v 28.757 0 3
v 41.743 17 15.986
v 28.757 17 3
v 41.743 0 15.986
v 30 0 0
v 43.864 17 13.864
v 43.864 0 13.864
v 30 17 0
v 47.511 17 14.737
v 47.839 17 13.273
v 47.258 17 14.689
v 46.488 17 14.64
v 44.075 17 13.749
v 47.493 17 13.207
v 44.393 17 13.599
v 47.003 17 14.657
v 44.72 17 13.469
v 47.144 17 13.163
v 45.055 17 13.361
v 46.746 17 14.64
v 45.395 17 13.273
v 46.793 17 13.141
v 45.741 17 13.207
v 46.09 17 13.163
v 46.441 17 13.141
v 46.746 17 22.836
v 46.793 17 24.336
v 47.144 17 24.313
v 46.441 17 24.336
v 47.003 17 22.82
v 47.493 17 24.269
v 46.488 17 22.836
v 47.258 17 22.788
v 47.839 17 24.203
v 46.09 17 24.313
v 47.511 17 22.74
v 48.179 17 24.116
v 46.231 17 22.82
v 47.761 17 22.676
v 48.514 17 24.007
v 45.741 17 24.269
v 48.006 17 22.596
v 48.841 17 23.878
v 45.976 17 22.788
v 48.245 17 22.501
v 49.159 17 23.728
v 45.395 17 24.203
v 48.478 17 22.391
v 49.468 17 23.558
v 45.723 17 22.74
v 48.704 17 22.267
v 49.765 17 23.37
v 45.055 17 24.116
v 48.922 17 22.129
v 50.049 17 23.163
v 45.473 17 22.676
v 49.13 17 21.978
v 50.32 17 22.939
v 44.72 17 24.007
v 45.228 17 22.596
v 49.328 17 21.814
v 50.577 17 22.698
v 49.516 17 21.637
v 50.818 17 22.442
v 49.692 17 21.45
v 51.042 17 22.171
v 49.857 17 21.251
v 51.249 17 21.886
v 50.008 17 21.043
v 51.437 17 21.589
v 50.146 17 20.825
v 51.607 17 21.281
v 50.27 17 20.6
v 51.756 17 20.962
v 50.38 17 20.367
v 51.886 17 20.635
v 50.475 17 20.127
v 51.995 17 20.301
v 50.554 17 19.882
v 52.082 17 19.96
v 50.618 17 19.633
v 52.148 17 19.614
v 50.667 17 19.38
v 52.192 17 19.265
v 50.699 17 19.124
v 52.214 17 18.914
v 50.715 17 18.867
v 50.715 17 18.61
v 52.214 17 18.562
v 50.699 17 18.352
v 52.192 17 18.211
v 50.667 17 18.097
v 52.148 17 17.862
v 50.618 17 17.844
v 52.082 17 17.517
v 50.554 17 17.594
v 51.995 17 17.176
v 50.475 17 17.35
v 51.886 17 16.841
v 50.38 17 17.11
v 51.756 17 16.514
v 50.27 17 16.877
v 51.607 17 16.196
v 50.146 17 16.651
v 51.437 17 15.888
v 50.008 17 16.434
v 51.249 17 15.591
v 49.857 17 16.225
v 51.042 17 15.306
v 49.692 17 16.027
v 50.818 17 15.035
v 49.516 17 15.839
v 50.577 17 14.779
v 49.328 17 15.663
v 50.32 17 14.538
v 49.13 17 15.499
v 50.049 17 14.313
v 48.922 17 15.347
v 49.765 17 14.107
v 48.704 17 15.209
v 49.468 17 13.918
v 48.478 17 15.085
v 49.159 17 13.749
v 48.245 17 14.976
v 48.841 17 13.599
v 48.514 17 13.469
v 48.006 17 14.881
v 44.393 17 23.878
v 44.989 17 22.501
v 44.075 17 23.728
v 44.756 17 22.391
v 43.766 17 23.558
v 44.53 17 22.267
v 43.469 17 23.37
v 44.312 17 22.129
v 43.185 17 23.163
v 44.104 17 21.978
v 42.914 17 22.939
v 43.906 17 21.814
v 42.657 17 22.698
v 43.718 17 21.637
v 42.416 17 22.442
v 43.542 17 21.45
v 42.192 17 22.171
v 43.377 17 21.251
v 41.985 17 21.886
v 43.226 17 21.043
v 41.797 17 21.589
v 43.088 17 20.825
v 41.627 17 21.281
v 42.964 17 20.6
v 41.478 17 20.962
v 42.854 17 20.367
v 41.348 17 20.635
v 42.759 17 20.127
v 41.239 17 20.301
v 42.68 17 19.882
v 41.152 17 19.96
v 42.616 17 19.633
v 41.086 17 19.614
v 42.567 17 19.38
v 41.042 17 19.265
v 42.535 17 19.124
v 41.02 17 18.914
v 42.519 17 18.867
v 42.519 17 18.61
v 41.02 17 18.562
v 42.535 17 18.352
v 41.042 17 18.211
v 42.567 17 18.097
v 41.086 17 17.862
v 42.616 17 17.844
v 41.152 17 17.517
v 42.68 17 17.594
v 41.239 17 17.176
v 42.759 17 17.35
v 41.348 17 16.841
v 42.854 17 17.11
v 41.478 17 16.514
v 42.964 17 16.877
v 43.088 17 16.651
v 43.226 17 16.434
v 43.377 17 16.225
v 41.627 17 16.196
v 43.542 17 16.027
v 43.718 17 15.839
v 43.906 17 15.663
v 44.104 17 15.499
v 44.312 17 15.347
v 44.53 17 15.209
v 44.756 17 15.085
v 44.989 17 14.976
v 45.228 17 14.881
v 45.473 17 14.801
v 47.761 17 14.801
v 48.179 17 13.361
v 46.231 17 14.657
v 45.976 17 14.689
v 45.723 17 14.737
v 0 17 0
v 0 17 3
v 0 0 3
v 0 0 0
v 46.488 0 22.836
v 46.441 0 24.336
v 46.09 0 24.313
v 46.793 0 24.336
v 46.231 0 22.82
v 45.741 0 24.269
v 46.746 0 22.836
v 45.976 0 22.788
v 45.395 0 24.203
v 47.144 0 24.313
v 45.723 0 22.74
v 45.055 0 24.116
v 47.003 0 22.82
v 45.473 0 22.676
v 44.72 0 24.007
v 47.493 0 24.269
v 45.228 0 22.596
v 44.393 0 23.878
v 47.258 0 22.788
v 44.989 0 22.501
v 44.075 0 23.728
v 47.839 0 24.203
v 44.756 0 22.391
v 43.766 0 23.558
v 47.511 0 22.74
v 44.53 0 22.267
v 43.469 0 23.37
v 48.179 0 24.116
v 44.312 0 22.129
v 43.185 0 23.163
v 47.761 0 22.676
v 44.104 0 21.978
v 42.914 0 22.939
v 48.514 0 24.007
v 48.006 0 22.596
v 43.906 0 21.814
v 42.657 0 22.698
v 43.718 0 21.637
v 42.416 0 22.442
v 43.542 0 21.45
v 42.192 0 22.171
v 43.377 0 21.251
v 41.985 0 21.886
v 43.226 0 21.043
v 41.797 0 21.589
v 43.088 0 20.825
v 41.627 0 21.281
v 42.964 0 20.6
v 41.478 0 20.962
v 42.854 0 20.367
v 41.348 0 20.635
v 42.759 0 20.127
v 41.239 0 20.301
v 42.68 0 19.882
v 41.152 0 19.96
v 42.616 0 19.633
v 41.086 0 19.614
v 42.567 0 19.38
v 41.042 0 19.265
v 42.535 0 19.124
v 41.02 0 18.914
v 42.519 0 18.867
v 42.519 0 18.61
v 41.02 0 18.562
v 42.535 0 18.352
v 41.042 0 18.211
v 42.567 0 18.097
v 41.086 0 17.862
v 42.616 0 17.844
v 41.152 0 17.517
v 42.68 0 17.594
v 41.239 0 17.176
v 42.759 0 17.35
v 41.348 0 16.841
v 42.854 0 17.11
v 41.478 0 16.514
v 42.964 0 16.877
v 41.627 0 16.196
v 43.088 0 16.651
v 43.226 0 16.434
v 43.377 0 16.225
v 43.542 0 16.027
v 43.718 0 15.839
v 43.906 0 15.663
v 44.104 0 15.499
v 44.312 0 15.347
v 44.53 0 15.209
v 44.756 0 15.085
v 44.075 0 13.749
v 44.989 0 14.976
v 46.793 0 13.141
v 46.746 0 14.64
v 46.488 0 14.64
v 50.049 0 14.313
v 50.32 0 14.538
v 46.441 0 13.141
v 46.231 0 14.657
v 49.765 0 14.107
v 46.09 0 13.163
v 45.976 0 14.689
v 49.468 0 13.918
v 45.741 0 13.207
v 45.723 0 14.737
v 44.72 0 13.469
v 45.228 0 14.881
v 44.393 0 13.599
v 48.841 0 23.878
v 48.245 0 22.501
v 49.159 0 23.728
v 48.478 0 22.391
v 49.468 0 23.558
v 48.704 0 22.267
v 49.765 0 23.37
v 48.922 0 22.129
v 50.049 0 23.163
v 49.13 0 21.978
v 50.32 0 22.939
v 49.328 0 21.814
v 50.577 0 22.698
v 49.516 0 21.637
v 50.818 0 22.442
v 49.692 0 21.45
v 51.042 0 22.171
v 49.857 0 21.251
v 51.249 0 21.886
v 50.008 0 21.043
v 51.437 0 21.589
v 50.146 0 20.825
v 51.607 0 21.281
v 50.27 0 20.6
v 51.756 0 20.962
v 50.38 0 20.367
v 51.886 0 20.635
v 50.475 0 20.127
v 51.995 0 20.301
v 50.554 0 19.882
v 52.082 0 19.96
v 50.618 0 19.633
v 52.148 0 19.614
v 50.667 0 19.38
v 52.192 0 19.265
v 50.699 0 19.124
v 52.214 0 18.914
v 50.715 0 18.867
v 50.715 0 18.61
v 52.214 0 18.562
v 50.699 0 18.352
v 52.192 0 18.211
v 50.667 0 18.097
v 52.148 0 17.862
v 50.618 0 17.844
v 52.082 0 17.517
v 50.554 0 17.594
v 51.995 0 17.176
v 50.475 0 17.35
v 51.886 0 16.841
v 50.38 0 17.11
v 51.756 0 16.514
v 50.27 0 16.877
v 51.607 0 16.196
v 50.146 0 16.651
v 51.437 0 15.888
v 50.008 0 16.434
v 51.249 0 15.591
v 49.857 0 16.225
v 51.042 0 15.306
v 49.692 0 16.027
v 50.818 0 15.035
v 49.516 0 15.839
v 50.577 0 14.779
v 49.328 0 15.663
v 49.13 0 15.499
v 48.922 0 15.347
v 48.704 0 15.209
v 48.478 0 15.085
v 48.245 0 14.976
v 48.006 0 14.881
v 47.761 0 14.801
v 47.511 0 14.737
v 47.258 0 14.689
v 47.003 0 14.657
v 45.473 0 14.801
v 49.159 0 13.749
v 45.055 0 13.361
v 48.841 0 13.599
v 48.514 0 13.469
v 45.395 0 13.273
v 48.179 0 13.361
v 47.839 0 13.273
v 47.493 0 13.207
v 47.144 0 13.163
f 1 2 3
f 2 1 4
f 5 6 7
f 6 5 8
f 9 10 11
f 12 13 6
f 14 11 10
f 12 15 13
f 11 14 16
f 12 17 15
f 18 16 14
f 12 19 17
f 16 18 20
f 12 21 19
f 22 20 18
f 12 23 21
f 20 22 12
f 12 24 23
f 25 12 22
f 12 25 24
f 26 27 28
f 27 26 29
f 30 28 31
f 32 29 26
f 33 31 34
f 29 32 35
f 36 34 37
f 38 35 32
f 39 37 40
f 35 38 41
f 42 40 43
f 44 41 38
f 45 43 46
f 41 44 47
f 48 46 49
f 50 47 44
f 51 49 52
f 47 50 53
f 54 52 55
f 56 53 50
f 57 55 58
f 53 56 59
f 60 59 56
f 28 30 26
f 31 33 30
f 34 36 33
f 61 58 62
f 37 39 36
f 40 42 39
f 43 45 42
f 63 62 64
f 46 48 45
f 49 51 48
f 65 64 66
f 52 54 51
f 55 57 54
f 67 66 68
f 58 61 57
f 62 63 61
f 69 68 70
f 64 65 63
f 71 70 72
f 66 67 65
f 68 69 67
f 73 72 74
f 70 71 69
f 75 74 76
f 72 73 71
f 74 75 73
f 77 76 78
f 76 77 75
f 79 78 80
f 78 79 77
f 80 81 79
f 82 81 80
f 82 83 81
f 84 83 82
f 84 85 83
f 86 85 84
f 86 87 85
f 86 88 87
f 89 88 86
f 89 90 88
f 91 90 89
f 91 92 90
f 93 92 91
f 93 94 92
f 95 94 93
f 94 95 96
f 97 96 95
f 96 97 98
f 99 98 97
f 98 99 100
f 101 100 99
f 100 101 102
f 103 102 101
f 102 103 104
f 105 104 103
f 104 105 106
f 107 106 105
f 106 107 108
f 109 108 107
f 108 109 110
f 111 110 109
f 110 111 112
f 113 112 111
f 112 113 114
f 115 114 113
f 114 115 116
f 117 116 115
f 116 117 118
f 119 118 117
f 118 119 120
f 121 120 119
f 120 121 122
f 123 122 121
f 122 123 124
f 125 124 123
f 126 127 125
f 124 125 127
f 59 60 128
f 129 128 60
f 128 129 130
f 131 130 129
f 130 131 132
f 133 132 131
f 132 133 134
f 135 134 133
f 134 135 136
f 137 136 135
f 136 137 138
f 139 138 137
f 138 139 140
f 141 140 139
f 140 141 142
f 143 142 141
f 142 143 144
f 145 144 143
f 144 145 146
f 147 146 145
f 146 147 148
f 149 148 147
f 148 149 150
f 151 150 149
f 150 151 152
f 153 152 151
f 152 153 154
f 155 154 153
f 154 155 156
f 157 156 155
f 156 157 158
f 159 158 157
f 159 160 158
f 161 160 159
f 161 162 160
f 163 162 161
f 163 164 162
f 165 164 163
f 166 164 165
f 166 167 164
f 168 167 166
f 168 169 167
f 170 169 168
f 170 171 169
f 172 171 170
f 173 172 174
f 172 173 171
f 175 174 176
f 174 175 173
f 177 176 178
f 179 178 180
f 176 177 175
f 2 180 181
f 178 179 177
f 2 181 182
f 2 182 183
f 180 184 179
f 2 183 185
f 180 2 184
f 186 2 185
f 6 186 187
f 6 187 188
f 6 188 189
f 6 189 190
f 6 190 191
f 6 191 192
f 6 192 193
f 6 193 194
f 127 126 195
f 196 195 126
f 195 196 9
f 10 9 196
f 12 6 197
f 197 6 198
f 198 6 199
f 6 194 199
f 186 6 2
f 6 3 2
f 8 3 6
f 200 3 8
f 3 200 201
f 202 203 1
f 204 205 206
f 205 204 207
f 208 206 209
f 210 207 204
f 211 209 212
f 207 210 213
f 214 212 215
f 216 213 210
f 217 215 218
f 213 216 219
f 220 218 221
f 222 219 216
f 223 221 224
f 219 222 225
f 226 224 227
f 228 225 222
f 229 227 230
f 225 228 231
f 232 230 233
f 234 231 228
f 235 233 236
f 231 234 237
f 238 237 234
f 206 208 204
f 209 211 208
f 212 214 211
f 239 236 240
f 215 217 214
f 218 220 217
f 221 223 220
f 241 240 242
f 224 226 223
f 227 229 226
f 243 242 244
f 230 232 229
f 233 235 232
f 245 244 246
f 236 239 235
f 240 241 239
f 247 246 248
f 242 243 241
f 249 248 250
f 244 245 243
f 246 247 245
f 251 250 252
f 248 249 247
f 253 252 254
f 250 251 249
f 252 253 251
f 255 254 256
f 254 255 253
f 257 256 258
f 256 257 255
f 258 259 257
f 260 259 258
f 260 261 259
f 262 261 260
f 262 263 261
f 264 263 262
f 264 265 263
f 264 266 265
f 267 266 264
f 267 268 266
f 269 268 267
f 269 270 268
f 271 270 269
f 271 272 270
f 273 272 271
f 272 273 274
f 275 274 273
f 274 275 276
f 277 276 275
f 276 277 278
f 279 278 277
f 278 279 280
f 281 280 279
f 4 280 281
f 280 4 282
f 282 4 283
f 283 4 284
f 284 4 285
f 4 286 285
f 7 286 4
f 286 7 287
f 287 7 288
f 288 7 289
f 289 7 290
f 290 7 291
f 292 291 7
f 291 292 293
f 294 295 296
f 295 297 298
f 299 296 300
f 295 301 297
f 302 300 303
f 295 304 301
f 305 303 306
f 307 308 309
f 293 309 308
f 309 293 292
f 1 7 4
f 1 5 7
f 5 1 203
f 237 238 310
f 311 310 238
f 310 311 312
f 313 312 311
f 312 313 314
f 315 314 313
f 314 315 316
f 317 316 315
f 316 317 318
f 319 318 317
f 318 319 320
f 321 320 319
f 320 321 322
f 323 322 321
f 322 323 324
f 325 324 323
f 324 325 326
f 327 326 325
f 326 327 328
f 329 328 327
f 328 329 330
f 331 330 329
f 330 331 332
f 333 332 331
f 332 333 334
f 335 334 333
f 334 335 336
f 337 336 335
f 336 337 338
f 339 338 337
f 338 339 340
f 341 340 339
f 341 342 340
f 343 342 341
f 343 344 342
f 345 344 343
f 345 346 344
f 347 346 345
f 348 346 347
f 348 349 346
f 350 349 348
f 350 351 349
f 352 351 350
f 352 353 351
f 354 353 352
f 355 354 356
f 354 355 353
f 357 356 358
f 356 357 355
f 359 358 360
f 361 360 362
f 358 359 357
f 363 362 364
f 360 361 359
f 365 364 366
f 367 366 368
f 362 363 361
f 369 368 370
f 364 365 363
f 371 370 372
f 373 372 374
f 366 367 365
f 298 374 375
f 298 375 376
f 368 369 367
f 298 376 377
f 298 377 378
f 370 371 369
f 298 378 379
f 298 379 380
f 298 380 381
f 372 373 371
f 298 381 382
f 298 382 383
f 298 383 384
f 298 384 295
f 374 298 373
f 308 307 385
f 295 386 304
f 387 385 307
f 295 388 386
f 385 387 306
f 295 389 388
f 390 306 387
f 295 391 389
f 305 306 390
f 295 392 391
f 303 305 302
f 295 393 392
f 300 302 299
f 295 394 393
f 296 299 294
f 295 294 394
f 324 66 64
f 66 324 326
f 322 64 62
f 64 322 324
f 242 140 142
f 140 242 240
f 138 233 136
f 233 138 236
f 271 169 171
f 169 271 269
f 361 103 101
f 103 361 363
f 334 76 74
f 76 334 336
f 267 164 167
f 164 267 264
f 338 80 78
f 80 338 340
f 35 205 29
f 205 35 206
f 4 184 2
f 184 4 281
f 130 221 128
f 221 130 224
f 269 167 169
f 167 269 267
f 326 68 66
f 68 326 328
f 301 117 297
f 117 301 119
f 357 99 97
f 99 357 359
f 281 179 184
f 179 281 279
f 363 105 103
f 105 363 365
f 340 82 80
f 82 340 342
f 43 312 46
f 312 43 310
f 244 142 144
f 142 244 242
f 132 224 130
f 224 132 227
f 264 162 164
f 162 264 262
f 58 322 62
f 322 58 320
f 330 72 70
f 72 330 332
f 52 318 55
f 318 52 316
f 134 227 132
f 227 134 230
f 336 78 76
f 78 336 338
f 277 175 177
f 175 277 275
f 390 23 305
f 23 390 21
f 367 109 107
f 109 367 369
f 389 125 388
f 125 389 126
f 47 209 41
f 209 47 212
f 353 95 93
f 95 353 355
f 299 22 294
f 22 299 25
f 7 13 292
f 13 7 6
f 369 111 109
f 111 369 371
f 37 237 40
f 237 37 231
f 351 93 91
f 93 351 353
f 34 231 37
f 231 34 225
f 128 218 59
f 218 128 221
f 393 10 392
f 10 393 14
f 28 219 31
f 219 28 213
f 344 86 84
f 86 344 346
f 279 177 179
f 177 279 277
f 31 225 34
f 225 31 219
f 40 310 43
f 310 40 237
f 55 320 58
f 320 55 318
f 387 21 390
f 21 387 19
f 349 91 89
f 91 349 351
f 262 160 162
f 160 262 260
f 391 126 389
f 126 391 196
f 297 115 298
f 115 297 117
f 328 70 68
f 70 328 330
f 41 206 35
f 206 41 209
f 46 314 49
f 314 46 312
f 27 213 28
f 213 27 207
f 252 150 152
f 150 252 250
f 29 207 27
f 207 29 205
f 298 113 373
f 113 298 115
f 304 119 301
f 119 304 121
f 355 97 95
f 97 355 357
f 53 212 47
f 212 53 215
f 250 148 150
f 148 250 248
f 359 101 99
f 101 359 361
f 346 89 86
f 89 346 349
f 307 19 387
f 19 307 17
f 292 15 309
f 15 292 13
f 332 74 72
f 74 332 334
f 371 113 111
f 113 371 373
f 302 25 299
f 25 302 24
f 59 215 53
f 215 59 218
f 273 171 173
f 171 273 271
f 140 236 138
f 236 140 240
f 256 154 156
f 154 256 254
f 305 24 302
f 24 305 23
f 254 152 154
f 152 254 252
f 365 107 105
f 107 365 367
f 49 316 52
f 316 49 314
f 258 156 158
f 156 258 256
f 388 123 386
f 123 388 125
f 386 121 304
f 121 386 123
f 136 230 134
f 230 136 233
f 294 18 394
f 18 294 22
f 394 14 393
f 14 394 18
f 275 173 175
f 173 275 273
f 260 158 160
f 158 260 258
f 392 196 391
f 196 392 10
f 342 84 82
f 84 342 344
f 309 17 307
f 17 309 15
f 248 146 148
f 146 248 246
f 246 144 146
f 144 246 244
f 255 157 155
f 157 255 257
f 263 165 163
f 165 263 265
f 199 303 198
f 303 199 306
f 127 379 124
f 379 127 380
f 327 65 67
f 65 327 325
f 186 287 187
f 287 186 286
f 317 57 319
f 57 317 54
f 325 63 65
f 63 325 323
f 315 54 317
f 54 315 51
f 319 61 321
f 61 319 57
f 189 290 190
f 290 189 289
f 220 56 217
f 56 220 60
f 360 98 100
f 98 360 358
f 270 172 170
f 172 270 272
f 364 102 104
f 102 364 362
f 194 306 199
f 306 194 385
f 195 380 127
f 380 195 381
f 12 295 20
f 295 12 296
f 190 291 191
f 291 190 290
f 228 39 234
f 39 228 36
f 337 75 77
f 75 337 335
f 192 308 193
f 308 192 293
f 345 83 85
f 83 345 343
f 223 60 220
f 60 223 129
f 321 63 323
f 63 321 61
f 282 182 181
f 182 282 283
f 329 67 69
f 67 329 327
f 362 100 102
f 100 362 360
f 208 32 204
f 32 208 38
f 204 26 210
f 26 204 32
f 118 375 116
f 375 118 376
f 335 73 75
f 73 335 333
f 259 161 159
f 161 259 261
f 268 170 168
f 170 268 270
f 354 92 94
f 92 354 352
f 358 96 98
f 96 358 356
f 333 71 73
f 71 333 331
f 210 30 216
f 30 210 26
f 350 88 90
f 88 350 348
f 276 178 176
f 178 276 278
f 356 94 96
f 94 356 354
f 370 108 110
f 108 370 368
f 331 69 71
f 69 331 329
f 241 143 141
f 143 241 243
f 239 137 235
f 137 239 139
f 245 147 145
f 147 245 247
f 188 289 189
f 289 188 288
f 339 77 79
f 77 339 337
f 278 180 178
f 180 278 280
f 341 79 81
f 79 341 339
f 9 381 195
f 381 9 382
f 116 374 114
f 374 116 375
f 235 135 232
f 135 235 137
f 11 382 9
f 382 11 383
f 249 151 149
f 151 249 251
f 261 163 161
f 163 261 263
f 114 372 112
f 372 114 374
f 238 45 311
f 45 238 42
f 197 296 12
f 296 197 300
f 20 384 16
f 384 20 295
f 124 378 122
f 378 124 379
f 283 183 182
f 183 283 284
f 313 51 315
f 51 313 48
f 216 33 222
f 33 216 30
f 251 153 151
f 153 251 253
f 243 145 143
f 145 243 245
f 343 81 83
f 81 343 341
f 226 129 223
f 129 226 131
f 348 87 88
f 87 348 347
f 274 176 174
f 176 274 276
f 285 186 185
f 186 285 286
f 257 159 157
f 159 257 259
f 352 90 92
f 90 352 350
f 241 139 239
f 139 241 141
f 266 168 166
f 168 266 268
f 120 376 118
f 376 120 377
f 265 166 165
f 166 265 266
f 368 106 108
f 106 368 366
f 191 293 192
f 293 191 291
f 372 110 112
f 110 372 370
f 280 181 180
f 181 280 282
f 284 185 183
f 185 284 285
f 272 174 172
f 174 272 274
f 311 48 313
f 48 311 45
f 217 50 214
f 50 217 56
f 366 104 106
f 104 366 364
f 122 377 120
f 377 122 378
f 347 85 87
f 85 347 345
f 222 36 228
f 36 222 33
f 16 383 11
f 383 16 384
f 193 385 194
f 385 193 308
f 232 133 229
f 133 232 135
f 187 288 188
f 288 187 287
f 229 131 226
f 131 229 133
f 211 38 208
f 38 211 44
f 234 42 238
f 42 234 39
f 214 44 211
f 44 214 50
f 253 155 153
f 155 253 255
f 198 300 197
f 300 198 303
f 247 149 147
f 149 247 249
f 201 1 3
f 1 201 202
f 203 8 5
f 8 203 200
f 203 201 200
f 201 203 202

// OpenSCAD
holder_width = 17;
holder_base_length = 30;
hook_thickness = 3;
hook_length = 30;
hole_diameter = 8.2;

union() {
    cube([holder_base_length,holder_width,hook_thickness]);
    translate([30,0,0])
    rotate([0,-45,0])
    difference() {
        union(){
            cube([hook_length,holder_width,hook_thickness]);
            translate([25,0,hook_thickness/2])
            rotate([-90,0,0])
            cylinder(
                h = holder_width,
                d = hole_diameter + hook_thickness,
                $fn = 100
            );
        }
        translate([25,-holder_width/2,hook_thickness/2])
        rotate([-90,0,0])
        cylinder(
            h = holder_width*2,
            d = hole_diameter,
            $fn = 100
        );
    }
}
